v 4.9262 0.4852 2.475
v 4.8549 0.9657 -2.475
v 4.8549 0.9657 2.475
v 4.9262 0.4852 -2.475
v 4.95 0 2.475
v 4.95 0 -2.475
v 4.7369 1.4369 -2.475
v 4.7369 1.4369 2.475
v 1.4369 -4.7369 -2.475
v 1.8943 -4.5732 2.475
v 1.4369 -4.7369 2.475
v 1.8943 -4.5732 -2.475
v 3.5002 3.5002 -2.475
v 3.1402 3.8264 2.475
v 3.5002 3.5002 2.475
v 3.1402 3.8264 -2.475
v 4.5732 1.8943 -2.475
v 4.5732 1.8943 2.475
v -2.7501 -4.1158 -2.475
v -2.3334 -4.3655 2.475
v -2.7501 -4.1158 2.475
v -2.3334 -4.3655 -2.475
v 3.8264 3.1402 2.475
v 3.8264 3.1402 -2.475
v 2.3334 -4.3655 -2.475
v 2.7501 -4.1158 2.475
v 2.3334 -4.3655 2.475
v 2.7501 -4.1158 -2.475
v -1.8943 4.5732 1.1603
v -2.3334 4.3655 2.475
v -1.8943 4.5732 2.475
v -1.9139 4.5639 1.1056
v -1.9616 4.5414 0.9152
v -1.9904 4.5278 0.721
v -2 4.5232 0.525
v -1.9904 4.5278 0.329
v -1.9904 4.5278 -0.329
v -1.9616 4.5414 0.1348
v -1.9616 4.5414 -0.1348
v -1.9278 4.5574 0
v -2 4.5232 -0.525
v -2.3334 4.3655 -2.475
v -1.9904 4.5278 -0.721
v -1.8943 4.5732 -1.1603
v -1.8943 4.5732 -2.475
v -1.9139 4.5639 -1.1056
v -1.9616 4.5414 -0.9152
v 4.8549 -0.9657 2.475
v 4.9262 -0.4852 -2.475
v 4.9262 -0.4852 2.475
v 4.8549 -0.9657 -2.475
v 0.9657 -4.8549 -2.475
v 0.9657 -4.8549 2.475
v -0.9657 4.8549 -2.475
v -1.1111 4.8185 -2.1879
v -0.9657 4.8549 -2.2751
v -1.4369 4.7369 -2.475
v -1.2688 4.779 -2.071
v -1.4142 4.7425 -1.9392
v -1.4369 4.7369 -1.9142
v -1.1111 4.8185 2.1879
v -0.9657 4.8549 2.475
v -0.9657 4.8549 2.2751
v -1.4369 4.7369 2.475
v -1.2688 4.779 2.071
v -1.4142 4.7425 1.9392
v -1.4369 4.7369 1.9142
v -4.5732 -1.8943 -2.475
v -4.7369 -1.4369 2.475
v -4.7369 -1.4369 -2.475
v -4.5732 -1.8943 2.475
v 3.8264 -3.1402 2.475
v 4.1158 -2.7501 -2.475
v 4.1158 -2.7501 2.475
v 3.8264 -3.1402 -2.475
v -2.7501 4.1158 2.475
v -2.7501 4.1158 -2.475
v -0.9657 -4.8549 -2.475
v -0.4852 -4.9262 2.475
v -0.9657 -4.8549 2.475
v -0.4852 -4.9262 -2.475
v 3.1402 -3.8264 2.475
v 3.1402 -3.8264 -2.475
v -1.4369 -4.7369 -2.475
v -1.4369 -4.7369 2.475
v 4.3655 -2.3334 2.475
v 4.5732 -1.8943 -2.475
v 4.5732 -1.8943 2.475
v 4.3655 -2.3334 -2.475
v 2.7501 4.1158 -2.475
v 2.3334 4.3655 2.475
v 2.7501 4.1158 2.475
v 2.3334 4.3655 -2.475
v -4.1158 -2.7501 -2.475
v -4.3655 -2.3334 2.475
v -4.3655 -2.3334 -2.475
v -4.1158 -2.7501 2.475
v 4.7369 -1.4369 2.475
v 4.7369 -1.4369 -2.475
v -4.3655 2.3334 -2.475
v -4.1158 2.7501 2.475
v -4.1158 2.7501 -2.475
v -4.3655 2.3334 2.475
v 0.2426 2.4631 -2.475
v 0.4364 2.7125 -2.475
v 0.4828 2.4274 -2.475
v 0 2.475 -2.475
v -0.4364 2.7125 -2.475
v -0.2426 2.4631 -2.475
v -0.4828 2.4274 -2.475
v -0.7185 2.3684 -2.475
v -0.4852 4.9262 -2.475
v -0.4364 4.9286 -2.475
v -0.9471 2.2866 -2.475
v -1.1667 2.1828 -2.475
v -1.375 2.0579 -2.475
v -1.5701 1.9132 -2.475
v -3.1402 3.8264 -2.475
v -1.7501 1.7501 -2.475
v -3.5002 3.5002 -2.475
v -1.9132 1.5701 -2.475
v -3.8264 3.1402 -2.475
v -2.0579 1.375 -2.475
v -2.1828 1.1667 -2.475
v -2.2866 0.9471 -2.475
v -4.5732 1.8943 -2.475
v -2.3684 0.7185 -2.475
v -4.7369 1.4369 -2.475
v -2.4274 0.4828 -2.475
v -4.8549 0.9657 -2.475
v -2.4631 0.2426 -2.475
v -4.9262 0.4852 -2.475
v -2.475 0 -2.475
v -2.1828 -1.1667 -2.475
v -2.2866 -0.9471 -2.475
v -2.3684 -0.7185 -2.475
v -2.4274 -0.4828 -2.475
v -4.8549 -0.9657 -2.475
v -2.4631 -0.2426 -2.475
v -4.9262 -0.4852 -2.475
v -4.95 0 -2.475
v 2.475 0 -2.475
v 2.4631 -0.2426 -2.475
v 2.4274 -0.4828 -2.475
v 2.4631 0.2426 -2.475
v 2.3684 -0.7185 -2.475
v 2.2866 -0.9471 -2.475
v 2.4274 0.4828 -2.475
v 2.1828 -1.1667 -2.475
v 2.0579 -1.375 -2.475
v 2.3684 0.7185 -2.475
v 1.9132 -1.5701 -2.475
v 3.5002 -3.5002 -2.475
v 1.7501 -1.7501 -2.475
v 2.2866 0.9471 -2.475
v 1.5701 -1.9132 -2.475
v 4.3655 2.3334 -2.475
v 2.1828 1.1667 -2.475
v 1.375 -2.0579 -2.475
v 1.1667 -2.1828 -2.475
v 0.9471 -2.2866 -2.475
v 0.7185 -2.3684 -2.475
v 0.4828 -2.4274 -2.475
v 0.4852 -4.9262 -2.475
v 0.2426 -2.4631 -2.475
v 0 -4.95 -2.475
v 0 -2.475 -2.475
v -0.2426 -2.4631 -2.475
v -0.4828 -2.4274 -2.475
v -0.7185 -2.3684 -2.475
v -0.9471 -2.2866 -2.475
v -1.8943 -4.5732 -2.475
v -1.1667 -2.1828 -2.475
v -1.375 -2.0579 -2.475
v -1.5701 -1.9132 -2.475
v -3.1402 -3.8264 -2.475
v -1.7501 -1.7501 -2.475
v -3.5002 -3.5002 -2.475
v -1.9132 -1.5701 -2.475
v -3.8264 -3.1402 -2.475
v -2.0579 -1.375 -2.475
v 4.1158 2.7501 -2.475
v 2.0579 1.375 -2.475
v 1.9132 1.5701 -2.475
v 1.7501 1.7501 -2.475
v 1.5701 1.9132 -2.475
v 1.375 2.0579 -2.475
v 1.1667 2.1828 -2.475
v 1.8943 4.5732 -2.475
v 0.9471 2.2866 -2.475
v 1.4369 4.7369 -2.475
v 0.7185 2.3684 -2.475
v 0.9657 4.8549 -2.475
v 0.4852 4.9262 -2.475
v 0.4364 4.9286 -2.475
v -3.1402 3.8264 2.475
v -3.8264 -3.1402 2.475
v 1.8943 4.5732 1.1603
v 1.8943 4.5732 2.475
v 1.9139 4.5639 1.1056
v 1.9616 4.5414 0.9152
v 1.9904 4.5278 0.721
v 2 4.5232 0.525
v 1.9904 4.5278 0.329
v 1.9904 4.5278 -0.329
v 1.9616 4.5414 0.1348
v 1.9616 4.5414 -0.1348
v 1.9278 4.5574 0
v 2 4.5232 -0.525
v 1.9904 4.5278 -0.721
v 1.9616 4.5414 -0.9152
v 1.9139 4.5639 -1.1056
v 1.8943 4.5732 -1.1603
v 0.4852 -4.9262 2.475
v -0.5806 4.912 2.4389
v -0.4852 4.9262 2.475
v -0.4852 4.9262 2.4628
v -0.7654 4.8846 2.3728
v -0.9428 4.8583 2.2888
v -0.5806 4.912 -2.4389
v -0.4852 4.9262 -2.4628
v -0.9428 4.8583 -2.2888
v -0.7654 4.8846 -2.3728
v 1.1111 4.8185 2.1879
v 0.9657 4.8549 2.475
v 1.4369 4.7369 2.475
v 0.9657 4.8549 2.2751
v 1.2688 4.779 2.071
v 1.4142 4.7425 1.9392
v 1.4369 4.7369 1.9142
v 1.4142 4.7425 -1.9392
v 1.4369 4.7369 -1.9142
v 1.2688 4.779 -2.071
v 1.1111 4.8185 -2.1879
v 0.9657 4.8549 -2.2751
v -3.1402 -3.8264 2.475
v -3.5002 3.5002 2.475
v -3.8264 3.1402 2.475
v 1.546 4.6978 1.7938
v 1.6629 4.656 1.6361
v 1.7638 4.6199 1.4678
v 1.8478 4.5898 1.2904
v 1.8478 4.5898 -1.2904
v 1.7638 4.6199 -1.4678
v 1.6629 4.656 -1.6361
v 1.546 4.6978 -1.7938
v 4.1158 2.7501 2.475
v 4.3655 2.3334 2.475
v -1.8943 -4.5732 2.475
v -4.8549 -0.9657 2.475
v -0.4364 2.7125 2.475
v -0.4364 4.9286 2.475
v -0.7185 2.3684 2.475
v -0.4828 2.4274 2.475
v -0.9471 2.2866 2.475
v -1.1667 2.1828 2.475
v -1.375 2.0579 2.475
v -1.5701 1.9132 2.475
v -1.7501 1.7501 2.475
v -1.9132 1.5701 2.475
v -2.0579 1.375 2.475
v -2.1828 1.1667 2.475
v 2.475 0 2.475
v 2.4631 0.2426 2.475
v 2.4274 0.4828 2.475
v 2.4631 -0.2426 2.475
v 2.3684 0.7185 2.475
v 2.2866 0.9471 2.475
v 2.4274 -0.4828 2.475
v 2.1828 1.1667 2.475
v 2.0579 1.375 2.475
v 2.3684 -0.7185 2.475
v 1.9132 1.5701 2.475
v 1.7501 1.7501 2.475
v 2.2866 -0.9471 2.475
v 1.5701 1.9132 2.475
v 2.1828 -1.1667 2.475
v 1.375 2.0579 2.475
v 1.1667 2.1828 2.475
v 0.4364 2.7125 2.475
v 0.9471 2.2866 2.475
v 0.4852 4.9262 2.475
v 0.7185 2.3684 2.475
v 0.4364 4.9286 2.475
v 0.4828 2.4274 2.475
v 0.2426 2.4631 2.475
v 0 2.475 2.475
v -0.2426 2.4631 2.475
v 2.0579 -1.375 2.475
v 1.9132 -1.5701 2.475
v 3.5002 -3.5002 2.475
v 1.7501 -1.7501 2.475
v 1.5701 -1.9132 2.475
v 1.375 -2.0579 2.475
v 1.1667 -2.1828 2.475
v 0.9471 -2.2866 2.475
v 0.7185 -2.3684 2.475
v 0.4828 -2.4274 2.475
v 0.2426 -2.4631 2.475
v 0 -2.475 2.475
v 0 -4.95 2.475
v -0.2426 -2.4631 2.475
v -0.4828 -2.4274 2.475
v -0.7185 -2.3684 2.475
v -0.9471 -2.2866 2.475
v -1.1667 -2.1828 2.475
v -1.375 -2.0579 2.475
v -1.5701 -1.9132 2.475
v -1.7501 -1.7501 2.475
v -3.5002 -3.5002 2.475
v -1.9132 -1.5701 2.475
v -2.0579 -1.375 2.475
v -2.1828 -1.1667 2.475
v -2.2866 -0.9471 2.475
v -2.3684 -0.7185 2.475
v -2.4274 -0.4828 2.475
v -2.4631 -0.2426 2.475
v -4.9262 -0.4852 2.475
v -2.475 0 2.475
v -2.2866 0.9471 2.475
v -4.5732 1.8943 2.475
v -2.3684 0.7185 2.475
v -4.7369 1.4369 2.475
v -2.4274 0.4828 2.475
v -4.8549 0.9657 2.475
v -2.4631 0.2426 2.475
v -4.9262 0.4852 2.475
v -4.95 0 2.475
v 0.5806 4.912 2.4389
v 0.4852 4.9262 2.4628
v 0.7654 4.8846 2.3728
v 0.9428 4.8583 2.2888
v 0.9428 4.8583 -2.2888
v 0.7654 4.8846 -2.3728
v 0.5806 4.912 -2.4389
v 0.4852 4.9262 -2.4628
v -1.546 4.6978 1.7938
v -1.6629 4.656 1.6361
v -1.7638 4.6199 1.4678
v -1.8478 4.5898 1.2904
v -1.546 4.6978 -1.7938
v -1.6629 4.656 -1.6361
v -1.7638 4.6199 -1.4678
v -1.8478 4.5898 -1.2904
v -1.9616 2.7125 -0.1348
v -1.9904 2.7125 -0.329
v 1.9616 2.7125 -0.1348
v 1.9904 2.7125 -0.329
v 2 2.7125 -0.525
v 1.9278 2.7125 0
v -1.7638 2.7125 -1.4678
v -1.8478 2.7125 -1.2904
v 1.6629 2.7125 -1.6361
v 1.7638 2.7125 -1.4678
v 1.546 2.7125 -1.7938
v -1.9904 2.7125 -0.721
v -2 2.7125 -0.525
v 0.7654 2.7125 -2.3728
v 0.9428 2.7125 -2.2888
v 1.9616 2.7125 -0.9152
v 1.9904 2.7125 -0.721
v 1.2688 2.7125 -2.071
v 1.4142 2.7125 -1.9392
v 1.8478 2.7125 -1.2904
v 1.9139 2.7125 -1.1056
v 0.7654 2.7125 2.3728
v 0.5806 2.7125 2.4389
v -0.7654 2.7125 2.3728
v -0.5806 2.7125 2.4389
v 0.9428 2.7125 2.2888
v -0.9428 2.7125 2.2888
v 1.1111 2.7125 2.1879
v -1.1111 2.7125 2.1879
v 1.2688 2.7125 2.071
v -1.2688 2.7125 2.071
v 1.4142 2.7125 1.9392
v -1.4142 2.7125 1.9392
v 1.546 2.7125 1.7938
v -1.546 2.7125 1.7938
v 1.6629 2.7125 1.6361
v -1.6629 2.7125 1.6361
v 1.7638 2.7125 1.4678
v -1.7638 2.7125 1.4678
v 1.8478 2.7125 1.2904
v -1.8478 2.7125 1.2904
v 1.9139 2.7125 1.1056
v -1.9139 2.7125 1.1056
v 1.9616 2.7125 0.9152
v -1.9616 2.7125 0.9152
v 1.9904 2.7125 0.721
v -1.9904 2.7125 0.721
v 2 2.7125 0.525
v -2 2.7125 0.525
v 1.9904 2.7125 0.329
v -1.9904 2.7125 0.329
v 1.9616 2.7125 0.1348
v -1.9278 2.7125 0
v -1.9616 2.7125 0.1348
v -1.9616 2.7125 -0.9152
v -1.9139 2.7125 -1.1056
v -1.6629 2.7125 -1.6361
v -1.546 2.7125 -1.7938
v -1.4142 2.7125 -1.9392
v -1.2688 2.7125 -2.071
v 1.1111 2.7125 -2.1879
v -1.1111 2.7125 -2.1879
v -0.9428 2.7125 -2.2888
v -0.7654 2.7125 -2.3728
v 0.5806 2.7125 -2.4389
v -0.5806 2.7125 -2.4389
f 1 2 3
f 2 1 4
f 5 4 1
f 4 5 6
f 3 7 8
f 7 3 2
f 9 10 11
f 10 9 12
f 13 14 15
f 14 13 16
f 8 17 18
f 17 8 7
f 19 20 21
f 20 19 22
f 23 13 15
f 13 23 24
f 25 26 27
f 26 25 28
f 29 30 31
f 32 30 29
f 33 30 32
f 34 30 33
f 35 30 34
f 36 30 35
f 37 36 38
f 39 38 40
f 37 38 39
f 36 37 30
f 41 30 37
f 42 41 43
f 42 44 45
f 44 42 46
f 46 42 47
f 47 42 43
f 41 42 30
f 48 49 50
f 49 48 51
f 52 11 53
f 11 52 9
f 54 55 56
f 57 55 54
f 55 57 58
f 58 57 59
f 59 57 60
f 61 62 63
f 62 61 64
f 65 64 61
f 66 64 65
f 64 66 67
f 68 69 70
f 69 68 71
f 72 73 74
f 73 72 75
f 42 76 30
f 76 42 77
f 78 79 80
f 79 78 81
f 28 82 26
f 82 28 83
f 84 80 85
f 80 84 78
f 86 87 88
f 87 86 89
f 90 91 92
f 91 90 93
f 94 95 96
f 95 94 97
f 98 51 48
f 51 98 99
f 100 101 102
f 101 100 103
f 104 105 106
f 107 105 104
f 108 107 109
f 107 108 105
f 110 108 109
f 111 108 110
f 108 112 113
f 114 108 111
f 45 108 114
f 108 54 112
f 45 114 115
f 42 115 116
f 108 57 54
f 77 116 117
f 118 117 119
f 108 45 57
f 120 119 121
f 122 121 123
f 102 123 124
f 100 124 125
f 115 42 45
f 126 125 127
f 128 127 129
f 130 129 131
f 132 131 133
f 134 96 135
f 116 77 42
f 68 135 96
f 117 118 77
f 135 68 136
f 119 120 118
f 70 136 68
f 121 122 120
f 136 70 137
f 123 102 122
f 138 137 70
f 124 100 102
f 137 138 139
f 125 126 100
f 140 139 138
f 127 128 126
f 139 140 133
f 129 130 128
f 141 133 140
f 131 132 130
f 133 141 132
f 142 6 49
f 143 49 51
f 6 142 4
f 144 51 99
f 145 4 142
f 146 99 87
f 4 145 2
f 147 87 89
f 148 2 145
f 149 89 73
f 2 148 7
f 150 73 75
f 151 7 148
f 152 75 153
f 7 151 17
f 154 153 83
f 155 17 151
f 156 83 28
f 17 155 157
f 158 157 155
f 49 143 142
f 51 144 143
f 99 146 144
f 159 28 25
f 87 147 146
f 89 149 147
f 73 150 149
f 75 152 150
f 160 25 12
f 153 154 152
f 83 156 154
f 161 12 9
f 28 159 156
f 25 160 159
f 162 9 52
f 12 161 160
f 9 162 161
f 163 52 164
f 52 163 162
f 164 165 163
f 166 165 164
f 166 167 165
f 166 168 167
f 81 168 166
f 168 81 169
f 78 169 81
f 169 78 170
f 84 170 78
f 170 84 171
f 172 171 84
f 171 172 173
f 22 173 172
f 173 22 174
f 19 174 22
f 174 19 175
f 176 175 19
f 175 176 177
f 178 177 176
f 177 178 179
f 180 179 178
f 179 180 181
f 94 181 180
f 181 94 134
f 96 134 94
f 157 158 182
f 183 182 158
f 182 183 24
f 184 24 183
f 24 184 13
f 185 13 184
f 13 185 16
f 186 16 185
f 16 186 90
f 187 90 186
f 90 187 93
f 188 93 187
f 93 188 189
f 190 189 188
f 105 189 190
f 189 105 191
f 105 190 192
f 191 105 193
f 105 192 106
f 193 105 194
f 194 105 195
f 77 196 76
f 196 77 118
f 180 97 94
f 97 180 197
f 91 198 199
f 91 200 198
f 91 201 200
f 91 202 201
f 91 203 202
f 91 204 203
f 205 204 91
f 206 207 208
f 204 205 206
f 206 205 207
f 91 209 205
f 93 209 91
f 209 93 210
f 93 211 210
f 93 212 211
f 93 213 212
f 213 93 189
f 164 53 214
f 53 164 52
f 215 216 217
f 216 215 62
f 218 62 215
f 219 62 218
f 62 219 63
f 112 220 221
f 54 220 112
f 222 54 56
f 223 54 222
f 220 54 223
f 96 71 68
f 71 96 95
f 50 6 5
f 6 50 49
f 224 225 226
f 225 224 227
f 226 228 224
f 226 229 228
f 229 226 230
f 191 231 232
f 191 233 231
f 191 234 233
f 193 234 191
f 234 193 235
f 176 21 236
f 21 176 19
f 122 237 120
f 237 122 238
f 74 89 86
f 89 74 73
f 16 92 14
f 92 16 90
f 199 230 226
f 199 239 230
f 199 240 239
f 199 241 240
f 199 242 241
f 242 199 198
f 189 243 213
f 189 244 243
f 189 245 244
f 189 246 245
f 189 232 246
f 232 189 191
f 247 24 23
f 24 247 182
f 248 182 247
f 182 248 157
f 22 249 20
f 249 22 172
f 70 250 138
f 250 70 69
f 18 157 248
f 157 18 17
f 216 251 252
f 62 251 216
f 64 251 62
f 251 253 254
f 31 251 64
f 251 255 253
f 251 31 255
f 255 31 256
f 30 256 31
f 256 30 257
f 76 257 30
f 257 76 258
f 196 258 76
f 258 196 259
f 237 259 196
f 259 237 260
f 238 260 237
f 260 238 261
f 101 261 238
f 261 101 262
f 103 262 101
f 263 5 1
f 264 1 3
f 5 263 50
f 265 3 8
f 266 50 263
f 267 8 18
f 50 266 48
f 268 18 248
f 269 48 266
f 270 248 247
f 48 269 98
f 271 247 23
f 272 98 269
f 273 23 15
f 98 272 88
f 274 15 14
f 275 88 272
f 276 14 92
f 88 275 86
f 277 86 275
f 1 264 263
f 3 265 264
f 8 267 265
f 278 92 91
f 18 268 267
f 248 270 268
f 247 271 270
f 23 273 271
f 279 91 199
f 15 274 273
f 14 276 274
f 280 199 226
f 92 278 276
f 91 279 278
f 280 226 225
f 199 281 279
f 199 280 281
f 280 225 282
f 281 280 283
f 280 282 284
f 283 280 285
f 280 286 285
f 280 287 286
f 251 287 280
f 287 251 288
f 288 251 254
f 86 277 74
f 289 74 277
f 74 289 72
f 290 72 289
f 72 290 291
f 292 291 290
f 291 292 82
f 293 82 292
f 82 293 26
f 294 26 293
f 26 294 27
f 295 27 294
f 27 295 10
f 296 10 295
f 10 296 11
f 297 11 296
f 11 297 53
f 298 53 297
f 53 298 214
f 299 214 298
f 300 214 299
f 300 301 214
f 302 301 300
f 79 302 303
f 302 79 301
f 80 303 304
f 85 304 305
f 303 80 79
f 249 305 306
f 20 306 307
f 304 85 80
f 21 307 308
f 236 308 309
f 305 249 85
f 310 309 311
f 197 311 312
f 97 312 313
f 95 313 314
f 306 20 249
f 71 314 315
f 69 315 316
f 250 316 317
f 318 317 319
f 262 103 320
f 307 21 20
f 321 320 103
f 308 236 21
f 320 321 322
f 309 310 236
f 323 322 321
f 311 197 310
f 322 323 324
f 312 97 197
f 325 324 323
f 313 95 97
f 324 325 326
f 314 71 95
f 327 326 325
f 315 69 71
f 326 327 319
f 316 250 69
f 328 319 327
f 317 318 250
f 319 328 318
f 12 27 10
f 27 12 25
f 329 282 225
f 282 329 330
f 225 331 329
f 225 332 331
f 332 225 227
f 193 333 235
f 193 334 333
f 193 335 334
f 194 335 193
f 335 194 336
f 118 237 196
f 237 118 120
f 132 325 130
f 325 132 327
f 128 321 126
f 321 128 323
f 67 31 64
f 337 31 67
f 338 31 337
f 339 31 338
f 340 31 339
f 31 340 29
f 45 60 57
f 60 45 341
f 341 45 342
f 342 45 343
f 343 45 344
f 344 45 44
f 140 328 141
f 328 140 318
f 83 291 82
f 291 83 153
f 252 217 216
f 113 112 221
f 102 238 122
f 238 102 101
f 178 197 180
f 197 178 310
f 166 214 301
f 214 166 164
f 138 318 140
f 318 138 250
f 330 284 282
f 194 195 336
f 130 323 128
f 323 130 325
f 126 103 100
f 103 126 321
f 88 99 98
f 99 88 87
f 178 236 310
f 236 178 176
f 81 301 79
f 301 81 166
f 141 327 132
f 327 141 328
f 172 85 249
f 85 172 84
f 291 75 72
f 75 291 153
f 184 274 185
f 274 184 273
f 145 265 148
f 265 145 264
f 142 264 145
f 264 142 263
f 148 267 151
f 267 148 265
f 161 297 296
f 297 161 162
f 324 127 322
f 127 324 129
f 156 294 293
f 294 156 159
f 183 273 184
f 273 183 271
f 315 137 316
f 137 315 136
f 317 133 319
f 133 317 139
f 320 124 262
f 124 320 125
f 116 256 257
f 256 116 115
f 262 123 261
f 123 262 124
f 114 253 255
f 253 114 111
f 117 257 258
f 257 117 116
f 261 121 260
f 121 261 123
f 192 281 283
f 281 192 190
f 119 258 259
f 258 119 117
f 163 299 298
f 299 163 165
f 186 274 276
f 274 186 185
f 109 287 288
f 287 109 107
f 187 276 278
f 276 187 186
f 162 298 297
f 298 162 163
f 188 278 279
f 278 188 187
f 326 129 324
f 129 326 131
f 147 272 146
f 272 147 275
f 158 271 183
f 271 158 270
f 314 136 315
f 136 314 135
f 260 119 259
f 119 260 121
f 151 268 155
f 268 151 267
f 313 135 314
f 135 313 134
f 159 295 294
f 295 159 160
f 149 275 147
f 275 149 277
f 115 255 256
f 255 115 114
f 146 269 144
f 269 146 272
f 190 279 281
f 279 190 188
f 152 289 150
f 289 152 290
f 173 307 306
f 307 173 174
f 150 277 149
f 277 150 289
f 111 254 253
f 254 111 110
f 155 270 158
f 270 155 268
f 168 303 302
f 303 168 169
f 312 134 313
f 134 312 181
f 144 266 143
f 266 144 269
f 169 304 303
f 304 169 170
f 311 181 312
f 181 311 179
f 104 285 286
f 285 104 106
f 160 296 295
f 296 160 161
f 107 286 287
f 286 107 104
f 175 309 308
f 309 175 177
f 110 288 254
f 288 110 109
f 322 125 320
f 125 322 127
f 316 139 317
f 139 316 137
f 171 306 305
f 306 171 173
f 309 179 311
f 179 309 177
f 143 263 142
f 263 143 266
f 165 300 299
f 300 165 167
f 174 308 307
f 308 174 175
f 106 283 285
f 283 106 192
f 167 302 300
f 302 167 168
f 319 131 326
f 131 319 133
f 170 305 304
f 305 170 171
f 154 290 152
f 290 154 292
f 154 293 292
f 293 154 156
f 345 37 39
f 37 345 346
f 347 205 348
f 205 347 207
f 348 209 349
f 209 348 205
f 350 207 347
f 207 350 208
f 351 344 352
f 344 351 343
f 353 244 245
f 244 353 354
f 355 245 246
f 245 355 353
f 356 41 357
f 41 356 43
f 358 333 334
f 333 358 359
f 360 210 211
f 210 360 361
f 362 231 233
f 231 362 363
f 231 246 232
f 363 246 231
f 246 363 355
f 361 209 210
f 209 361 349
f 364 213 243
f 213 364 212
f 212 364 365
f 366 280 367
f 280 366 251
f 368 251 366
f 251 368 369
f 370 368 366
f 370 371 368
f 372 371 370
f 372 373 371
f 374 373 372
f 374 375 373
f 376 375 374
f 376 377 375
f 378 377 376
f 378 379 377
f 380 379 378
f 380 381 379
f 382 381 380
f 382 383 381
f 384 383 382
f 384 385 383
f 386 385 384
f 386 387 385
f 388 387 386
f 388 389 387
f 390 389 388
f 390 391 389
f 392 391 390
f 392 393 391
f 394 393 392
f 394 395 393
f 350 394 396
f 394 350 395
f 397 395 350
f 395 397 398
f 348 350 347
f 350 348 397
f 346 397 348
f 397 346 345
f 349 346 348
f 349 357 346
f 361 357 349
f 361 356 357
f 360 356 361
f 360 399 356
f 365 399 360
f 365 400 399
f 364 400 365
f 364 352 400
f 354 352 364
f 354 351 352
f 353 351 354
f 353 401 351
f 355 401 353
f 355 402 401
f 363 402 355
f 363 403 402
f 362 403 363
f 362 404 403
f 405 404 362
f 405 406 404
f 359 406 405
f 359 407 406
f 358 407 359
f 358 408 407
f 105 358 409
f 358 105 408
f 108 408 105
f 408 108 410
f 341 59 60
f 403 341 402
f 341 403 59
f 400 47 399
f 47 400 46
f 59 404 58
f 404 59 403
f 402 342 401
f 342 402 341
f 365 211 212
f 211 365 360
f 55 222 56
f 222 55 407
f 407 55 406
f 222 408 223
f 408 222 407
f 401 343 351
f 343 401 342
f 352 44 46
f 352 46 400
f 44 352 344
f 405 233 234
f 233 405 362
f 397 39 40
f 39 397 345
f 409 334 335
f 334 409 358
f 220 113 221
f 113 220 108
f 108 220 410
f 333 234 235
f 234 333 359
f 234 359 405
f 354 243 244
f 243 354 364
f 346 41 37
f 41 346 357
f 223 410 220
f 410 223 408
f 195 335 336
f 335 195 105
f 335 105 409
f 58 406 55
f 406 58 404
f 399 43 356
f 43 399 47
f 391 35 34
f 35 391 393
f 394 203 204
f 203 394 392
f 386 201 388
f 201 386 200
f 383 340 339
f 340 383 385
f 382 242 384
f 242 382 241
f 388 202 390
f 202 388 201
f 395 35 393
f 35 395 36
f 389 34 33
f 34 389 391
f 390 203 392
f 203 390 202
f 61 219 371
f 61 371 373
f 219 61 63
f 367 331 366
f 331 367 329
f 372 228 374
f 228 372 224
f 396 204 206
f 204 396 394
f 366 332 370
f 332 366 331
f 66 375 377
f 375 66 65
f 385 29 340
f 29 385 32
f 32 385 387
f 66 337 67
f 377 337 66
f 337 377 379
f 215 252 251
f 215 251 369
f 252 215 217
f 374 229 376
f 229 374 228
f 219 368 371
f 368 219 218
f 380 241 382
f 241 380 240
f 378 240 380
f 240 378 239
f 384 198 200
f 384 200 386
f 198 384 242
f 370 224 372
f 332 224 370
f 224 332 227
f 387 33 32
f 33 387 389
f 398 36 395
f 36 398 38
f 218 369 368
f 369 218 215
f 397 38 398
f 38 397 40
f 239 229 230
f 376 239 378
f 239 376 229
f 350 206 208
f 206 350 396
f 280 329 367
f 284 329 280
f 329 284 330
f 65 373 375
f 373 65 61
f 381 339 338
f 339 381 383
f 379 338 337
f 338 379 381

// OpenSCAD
// COBRA Vertebra - C3 V2
// Height: 4.95mm, OD: 9.9mm

$fn = 64;

difference() {
    // Outer cylinder
    cylinder(h=4.95, d=9.9, center=true);
    
    // Inner channel
    cylinder(h=6.95, d=4.95, center=true);

    // Pivot holes
    translate([0, 4.95, -0.5249999999999999])
    rotate([90, 0, 0])
    cylinder(h=4.475, d=4, center=true);
    
    translate([0, 4.95, 0.5249999999999999])
    rotate([90, 0, 0])
    cylinder(h=4.475, d=4, center=true);
}
